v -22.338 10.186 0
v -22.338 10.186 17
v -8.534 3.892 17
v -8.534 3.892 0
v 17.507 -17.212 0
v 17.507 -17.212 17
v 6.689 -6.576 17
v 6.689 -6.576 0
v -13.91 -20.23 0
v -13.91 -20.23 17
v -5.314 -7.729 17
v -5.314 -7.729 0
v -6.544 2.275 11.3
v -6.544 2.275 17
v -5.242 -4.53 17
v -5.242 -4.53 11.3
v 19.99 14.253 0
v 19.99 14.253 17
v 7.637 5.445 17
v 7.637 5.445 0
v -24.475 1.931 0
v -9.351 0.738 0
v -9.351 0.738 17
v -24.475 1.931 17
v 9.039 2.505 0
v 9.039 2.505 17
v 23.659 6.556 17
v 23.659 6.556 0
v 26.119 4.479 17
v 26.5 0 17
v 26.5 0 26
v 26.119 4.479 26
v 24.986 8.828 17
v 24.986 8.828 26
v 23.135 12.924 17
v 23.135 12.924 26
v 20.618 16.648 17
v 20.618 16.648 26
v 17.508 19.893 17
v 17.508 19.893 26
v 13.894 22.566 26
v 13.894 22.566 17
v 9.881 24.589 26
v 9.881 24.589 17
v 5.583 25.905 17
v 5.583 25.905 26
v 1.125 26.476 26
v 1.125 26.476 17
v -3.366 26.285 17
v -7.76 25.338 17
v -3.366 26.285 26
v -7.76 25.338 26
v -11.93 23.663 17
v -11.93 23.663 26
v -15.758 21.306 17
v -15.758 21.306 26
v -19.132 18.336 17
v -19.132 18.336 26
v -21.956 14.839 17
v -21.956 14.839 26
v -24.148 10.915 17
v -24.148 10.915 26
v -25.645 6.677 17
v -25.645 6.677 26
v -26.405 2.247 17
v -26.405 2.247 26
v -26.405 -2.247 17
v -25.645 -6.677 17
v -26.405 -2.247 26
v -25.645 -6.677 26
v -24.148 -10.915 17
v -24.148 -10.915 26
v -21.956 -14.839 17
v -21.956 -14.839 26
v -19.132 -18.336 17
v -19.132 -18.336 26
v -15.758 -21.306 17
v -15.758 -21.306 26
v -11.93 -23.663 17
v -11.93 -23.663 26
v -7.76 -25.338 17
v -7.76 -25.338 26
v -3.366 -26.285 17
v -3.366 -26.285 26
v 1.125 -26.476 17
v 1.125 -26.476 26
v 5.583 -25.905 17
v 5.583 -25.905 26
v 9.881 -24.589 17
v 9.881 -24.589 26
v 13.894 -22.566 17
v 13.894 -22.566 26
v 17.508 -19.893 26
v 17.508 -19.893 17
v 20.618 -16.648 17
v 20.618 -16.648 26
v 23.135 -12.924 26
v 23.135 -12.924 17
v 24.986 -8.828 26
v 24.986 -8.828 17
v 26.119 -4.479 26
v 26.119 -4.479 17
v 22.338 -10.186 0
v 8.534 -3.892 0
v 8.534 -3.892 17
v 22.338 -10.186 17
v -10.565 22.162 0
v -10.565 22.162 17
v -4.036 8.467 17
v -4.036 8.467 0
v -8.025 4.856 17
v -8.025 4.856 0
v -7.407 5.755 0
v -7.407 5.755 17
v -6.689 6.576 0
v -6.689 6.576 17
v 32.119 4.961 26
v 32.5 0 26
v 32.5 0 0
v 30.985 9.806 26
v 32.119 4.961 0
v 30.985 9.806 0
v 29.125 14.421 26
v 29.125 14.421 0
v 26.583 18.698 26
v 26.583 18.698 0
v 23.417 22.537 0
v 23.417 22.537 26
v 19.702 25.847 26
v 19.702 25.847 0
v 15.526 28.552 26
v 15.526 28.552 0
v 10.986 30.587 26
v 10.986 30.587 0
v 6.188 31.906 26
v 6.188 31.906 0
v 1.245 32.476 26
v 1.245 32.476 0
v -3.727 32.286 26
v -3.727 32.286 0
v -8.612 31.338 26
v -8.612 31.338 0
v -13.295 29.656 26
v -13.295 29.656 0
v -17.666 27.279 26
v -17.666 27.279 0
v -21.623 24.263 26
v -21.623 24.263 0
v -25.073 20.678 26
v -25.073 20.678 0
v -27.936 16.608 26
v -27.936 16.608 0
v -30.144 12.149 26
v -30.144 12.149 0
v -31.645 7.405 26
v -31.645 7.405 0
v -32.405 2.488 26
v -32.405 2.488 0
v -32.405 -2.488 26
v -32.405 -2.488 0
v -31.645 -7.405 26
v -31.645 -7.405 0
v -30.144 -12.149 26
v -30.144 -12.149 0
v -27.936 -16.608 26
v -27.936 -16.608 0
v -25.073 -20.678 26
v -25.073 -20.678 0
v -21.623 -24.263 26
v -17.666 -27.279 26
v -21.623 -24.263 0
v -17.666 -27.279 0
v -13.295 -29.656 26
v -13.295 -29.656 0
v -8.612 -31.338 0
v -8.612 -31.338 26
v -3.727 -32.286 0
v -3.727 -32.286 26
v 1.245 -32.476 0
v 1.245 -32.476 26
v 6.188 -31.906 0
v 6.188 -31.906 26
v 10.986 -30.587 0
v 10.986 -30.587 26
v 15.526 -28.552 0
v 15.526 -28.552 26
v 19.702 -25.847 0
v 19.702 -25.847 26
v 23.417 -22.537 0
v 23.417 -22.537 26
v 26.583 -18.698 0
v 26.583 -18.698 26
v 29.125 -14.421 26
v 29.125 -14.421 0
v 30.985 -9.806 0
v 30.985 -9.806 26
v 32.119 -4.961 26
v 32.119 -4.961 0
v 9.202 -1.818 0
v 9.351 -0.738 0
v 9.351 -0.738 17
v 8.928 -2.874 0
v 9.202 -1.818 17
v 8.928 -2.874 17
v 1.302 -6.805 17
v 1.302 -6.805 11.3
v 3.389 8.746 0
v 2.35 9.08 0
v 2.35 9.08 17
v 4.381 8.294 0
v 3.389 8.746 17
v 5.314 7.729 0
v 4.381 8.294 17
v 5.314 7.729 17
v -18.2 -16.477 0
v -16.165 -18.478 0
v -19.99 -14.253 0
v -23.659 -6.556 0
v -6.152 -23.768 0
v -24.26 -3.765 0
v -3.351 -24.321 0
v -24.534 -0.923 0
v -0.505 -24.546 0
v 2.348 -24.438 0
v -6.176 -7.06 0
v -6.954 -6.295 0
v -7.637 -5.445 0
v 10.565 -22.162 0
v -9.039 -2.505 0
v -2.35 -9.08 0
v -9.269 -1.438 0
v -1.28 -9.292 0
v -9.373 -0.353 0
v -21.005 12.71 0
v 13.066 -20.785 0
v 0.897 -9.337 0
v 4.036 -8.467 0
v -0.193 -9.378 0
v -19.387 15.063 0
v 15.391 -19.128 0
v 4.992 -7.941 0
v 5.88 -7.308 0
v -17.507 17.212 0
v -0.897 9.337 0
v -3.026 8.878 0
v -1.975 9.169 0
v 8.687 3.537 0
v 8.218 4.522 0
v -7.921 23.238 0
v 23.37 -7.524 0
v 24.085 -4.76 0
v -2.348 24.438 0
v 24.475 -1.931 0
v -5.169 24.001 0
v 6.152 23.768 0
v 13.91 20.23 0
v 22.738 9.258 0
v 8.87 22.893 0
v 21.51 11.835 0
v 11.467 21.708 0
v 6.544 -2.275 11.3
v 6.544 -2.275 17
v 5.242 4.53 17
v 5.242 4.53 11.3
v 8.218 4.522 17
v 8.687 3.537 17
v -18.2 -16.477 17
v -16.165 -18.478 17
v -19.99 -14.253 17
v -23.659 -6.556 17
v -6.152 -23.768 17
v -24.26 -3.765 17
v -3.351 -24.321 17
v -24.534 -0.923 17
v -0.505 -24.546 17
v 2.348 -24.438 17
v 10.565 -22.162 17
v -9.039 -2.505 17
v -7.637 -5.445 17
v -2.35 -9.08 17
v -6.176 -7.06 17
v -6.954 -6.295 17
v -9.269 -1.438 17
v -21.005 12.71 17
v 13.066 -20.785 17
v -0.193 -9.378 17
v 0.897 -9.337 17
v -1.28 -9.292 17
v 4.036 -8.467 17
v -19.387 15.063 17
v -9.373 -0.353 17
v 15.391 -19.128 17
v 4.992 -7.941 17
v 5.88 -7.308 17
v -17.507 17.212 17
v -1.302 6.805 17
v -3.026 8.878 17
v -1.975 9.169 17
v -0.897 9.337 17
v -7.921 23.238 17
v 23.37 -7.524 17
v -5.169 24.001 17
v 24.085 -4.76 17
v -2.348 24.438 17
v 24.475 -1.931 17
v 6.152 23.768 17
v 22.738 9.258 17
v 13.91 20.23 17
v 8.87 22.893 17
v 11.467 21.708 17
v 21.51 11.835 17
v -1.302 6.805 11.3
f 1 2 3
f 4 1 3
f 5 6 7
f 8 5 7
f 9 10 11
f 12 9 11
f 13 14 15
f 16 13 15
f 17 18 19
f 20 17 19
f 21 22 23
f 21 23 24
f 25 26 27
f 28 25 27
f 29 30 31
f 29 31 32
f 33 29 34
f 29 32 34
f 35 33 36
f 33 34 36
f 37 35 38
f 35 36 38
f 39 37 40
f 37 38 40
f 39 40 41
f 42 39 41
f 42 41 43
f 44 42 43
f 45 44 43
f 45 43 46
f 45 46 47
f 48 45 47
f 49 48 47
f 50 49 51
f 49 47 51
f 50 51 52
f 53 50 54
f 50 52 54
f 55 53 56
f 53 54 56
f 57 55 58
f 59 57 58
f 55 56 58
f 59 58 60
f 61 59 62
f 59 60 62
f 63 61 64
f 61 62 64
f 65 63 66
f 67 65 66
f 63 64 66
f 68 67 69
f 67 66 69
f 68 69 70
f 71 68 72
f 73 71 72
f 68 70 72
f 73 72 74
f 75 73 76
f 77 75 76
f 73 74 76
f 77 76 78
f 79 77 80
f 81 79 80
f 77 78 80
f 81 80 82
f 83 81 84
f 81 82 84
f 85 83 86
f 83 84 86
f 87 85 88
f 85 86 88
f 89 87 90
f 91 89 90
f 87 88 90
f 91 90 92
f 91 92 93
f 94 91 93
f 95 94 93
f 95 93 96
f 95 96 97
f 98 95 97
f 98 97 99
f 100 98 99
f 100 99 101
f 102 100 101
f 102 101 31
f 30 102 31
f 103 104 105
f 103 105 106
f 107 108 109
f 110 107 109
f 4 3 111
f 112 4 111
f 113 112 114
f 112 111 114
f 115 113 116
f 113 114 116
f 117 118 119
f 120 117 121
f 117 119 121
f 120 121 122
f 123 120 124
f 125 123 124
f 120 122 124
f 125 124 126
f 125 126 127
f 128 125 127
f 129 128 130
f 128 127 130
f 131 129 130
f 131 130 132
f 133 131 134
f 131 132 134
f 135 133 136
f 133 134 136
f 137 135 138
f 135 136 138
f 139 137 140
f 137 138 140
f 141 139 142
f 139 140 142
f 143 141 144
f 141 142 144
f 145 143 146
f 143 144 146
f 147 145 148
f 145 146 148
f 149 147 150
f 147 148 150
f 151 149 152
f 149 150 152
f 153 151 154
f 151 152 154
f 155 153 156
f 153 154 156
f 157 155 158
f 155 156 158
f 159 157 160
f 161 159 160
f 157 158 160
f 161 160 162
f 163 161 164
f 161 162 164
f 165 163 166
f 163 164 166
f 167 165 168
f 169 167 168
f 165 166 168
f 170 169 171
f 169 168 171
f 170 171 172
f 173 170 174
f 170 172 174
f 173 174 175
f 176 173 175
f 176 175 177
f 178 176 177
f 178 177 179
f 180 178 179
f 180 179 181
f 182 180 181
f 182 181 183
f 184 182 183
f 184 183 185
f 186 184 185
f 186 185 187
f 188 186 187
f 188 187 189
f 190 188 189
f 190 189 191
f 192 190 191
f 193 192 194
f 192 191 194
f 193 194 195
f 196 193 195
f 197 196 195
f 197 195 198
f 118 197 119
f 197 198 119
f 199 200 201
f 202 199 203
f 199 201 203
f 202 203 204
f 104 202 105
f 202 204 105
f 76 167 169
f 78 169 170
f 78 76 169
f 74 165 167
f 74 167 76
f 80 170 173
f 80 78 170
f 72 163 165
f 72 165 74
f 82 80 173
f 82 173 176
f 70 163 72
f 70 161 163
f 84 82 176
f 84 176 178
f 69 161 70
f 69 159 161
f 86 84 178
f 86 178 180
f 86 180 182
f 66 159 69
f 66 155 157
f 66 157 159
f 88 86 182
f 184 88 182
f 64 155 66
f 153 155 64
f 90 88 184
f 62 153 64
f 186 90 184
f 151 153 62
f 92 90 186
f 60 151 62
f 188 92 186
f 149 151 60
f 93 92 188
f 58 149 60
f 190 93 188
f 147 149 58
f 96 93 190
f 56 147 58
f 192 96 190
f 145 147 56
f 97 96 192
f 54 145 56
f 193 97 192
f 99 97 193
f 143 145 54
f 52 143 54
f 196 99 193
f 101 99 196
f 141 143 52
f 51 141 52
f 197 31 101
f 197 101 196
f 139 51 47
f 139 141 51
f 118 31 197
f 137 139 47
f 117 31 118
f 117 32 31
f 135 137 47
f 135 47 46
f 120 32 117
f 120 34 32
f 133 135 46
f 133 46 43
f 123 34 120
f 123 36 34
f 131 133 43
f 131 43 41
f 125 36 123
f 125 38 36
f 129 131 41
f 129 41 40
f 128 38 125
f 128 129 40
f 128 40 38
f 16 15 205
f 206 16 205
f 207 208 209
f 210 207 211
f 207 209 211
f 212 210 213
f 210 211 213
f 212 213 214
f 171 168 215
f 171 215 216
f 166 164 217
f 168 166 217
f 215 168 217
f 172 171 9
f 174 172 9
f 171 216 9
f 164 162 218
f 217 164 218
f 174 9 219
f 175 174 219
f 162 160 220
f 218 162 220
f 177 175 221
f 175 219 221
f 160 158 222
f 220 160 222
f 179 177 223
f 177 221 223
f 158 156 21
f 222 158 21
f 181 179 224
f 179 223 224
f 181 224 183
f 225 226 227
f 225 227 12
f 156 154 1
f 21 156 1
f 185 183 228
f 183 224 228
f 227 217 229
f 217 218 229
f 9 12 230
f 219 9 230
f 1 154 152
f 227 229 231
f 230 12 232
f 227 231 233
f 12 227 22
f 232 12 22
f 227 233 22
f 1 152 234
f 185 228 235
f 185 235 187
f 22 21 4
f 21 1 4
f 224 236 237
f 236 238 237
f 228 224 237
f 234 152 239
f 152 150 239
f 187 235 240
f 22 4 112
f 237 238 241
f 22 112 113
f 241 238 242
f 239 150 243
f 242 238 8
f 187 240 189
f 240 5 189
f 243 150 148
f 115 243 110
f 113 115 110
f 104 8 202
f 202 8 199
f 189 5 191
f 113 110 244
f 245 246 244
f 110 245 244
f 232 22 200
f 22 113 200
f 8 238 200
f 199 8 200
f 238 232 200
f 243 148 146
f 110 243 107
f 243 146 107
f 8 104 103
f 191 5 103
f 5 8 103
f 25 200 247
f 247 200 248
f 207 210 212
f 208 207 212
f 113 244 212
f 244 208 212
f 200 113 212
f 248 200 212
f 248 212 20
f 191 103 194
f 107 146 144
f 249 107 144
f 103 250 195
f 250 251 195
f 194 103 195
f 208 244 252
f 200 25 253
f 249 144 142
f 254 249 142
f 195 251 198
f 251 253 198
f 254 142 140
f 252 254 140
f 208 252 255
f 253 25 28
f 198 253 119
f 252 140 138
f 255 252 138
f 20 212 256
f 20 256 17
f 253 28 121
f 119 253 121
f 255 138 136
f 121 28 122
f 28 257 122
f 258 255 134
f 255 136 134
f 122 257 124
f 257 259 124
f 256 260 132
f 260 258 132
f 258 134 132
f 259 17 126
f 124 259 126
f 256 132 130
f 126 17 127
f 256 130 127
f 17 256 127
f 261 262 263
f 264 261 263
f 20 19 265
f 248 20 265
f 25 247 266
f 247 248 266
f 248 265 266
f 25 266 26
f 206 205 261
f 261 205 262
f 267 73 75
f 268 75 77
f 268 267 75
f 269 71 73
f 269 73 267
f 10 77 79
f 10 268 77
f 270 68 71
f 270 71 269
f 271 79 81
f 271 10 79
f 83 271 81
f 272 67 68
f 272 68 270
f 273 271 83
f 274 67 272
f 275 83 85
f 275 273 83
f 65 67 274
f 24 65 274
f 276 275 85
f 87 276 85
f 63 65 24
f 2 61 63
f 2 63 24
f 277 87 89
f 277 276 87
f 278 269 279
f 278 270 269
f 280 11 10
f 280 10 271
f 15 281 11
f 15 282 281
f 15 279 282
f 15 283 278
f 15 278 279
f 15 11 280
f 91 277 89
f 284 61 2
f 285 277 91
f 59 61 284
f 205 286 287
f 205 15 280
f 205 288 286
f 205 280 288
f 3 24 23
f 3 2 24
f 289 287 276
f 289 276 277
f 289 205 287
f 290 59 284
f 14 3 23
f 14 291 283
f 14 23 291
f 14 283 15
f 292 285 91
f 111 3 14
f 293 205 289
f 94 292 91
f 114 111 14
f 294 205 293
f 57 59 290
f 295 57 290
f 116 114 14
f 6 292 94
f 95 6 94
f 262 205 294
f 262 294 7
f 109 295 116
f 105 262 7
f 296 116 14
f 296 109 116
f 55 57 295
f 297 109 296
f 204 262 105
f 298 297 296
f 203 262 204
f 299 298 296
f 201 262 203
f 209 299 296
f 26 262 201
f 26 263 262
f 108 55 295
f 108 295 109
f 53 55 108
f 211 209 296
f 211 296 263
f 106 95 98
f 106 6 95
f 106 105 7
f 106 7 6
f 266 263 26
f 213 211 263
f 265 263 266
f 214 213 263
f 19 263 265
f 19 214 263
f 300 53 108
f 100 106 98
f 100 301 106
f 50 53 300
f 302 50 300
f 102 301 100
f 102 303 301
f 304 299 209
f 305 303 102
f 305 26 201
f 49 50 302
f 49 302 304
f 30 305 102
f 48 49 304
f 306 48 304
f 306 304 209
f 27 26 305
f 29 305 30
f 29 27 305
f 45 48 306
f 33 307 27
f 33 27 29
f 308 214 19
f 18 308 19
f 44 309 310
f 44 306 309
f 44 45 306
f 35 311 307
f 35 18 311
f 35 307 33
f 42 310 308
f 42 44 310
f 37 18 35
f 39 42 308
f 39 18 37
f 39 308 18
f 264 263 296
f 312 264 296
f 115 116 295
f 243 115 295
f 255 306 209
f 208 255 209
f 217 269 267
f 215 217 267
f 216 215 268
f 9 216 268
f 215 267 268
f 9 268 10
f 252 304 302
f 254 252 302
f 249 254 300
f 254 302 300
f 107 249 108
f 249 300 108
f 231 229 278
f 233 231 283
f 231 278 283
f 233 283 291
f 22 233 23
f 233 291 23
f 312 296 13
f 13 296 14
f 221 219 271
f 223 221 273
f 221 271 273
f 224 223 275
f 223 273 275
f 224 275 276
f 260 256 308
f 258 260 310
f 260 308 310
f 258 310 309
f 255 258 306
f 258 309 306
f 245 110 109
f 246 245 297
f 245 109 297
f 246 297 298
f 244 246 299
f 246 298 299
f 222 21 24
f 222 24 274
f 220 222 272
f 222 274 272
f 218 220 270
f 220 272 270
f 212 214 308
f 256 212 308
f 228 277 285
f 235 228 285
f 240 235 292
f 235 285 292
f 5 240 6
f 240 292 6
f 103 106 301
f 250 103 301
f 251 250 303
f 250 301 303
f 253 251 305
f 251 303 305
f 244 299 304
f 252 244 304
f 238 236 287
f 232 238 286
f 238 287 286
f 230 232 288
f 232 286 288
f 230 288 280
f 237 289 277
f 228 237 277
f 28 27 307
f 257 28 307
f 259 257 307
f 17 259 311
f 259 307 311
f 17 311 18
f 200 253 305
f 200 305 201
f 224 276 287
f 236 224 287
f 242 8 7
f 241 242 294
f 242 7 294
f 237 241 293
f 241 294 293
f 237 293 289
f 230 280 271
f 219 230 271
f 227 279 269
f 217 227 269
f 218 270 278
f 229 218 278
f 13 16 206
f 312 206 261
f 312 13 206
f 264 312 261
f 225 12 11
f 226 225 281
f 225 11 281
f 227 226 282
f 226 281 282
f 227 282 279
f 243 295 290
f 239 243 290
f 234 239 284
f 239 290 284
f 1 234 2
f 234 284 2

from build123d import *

# Parameters (mm, degrees)
F0_R     = 32.5
F1_DEPTH = 26
F3_DEPTH = 14.7
F4_R     = 26.5
F5_DEPTH = 9
F7_DEPTH = 25


with BuildPart() as f1:
    # F0 (on Top) → F1 (new body)
    with BuildSketch(Plane.XY):
        Circle(F0_R)
    extrude(amount=F1_DEPTH)

    # F2 (on face) → F3 (cut)
    with BuildSketch(Plane.XY.offset(26)):
        Polygon((-6.544173, 2.2746), (-5.241948, -4.53012), (1.302225, -6.80472), (6.544173, -2.2746), (5.241948, 4.53012), (-1.302225, 6.80472), align=None)
    extrude(amount=-F3_DEPTH, mode=Mode.SUBTRACT)

    # F4 (on face) → F5 (cut)
    with BuildSketch(Plane.XY.offset(26)):
        Circle(F4_R)
    extrude(amount=-F5_DEPTH, mode=Mode.SUBTRACT)

    # F6 (on face) → F7 (cut)
    with BuildSketch(Plane.XY.offset(17)):
        with BuildLine():
            Line((-22.338205, 10.185808), (-8.534389, 3.891523))
            ThreePointArc((-8.534389, 3.891523), (-7.728976, 5.314383), (-6.688723, 6.575768))
            Line((-6.688723, 6.575768), (-17.507295, 17.211645))
            ThreePointArc((-17.507295, 17.211645), (-20.230091, 13.910051), (-22.338205, 10.185808))
        make_face()
        with BuildLine():
            Line((-23.659369, -6.55594), (-9.039144, -2.50472))
            ThreePointArc((-9.039144, -2.50472), (-9.336759, -0.897036), (-9.350681, 0.737903))
            Line((-9.350681, 0.737903), (-24.474798, 1.931412))
            ThreePointArc((-24.474798, 1.931412), (-24.438357, -2.347934), (-23.659369, -6.55594))
        make_face()
        with BuildLine():
            Line((-13.910051, -20.230091), (-5.314383, -7.728976))
            ThreePointArc((-5.314383, -7.728976), (-6.575768, -6.688723), (-7.637352, -5.445236))
            Line((-7.637352, -5.445236), (-19.990271, -14.252549))
            ThreePointArc((-19.990271, -14.252549), (-17.211645, -17.507295), (-13.910051, -20.230091))
        make_face()
        with BuildLine():
            Line((2.347934, -24.438357), (0.897036, -9.336759))
            ThreePointArc((0.897036, -9.336759), (-0.737903, -9.350681), (-2.350421, -9.080488))
            Line((-2.350421, -9.080488), (-6.152074, -23.767585))
            ThreePointArc((-6.152074, -23.767585), (-1.931412, -24.474798), (2.347934, -24.438357))
        make_face()
        with BuildLine():
            Line((17.507295, -17.211645), (6.688723, -6.575768))
            ThreePointArc((6.688723, -6.575768), (5.445236, -7.637352), (4.036298, -8.466879))
            Line((4.036298, -8.466879), (10.564747, -22.161503))
            ThreePointArc((10.564747, -22.161503), (14.252549, -19.990271), (17.507295, -17.211645))
        make_face()
        with BuildLine():
            Line((24.474798, -1.931412), (9.350681, -0.737903))
            ThreePointArc((9.350681, -0.737903), (9.080488, -2.350421), (8.534389, -3.891523))
            Line((8.534389, -3.891523), (22.338205, -10.185808))
            ThreePointArc((22.338205, -10.185808), (23.767585, -6.152074), (24.474798, -1.931412))
        make_face()
        with BuildLine():
            Line((19.990271, 14.252549), (7.637352, 5.445236))
            ThreePointArc((7.637352, 5.445236), (8.466879, 4.036298), (9.039144, 2.50472))
            Line((9.039144, 2.50472), (23.659369, 6.55594))
            ThreePointArc((23.659369, 6.55594), (22.161503, 10.564747), (19.990271, 14.252549))
        make_face()
        with BuildLine():
            Line((6.152074, 23.767585), (2.350421, 9.080488))
            ThreePointArc((2.350421, 9.080488), (3.891523, 8.534389), (5.314383, 7.728976))
            Line((5.314383, 7.728976), (13.910051, 20.230091))
            ThreePointArc((13.910051, 20.230091), (10.185808, 22.338205), (6.152074, 23.767585))
        make_face()
        with BuildLine():
            Line((-0.897036, 9.336759), (-2.347934, 24.438357))
            ThreePointArc((-2.347934, 24.438357), (-6.55594, 23.659369), (-10.564747, 22.161503))
            Line((-10.564747, 22.161503), (-4.036298, 8.466879))
            ThreePointArc((-4.036298, 8.466879), (-2.50472, 9.039144), (-0.897036, 9.336759))
        make_face()
    extrude(amount=-F7_DEPTH, mode=Mode.SUBTRACT)


solid = f1.part
